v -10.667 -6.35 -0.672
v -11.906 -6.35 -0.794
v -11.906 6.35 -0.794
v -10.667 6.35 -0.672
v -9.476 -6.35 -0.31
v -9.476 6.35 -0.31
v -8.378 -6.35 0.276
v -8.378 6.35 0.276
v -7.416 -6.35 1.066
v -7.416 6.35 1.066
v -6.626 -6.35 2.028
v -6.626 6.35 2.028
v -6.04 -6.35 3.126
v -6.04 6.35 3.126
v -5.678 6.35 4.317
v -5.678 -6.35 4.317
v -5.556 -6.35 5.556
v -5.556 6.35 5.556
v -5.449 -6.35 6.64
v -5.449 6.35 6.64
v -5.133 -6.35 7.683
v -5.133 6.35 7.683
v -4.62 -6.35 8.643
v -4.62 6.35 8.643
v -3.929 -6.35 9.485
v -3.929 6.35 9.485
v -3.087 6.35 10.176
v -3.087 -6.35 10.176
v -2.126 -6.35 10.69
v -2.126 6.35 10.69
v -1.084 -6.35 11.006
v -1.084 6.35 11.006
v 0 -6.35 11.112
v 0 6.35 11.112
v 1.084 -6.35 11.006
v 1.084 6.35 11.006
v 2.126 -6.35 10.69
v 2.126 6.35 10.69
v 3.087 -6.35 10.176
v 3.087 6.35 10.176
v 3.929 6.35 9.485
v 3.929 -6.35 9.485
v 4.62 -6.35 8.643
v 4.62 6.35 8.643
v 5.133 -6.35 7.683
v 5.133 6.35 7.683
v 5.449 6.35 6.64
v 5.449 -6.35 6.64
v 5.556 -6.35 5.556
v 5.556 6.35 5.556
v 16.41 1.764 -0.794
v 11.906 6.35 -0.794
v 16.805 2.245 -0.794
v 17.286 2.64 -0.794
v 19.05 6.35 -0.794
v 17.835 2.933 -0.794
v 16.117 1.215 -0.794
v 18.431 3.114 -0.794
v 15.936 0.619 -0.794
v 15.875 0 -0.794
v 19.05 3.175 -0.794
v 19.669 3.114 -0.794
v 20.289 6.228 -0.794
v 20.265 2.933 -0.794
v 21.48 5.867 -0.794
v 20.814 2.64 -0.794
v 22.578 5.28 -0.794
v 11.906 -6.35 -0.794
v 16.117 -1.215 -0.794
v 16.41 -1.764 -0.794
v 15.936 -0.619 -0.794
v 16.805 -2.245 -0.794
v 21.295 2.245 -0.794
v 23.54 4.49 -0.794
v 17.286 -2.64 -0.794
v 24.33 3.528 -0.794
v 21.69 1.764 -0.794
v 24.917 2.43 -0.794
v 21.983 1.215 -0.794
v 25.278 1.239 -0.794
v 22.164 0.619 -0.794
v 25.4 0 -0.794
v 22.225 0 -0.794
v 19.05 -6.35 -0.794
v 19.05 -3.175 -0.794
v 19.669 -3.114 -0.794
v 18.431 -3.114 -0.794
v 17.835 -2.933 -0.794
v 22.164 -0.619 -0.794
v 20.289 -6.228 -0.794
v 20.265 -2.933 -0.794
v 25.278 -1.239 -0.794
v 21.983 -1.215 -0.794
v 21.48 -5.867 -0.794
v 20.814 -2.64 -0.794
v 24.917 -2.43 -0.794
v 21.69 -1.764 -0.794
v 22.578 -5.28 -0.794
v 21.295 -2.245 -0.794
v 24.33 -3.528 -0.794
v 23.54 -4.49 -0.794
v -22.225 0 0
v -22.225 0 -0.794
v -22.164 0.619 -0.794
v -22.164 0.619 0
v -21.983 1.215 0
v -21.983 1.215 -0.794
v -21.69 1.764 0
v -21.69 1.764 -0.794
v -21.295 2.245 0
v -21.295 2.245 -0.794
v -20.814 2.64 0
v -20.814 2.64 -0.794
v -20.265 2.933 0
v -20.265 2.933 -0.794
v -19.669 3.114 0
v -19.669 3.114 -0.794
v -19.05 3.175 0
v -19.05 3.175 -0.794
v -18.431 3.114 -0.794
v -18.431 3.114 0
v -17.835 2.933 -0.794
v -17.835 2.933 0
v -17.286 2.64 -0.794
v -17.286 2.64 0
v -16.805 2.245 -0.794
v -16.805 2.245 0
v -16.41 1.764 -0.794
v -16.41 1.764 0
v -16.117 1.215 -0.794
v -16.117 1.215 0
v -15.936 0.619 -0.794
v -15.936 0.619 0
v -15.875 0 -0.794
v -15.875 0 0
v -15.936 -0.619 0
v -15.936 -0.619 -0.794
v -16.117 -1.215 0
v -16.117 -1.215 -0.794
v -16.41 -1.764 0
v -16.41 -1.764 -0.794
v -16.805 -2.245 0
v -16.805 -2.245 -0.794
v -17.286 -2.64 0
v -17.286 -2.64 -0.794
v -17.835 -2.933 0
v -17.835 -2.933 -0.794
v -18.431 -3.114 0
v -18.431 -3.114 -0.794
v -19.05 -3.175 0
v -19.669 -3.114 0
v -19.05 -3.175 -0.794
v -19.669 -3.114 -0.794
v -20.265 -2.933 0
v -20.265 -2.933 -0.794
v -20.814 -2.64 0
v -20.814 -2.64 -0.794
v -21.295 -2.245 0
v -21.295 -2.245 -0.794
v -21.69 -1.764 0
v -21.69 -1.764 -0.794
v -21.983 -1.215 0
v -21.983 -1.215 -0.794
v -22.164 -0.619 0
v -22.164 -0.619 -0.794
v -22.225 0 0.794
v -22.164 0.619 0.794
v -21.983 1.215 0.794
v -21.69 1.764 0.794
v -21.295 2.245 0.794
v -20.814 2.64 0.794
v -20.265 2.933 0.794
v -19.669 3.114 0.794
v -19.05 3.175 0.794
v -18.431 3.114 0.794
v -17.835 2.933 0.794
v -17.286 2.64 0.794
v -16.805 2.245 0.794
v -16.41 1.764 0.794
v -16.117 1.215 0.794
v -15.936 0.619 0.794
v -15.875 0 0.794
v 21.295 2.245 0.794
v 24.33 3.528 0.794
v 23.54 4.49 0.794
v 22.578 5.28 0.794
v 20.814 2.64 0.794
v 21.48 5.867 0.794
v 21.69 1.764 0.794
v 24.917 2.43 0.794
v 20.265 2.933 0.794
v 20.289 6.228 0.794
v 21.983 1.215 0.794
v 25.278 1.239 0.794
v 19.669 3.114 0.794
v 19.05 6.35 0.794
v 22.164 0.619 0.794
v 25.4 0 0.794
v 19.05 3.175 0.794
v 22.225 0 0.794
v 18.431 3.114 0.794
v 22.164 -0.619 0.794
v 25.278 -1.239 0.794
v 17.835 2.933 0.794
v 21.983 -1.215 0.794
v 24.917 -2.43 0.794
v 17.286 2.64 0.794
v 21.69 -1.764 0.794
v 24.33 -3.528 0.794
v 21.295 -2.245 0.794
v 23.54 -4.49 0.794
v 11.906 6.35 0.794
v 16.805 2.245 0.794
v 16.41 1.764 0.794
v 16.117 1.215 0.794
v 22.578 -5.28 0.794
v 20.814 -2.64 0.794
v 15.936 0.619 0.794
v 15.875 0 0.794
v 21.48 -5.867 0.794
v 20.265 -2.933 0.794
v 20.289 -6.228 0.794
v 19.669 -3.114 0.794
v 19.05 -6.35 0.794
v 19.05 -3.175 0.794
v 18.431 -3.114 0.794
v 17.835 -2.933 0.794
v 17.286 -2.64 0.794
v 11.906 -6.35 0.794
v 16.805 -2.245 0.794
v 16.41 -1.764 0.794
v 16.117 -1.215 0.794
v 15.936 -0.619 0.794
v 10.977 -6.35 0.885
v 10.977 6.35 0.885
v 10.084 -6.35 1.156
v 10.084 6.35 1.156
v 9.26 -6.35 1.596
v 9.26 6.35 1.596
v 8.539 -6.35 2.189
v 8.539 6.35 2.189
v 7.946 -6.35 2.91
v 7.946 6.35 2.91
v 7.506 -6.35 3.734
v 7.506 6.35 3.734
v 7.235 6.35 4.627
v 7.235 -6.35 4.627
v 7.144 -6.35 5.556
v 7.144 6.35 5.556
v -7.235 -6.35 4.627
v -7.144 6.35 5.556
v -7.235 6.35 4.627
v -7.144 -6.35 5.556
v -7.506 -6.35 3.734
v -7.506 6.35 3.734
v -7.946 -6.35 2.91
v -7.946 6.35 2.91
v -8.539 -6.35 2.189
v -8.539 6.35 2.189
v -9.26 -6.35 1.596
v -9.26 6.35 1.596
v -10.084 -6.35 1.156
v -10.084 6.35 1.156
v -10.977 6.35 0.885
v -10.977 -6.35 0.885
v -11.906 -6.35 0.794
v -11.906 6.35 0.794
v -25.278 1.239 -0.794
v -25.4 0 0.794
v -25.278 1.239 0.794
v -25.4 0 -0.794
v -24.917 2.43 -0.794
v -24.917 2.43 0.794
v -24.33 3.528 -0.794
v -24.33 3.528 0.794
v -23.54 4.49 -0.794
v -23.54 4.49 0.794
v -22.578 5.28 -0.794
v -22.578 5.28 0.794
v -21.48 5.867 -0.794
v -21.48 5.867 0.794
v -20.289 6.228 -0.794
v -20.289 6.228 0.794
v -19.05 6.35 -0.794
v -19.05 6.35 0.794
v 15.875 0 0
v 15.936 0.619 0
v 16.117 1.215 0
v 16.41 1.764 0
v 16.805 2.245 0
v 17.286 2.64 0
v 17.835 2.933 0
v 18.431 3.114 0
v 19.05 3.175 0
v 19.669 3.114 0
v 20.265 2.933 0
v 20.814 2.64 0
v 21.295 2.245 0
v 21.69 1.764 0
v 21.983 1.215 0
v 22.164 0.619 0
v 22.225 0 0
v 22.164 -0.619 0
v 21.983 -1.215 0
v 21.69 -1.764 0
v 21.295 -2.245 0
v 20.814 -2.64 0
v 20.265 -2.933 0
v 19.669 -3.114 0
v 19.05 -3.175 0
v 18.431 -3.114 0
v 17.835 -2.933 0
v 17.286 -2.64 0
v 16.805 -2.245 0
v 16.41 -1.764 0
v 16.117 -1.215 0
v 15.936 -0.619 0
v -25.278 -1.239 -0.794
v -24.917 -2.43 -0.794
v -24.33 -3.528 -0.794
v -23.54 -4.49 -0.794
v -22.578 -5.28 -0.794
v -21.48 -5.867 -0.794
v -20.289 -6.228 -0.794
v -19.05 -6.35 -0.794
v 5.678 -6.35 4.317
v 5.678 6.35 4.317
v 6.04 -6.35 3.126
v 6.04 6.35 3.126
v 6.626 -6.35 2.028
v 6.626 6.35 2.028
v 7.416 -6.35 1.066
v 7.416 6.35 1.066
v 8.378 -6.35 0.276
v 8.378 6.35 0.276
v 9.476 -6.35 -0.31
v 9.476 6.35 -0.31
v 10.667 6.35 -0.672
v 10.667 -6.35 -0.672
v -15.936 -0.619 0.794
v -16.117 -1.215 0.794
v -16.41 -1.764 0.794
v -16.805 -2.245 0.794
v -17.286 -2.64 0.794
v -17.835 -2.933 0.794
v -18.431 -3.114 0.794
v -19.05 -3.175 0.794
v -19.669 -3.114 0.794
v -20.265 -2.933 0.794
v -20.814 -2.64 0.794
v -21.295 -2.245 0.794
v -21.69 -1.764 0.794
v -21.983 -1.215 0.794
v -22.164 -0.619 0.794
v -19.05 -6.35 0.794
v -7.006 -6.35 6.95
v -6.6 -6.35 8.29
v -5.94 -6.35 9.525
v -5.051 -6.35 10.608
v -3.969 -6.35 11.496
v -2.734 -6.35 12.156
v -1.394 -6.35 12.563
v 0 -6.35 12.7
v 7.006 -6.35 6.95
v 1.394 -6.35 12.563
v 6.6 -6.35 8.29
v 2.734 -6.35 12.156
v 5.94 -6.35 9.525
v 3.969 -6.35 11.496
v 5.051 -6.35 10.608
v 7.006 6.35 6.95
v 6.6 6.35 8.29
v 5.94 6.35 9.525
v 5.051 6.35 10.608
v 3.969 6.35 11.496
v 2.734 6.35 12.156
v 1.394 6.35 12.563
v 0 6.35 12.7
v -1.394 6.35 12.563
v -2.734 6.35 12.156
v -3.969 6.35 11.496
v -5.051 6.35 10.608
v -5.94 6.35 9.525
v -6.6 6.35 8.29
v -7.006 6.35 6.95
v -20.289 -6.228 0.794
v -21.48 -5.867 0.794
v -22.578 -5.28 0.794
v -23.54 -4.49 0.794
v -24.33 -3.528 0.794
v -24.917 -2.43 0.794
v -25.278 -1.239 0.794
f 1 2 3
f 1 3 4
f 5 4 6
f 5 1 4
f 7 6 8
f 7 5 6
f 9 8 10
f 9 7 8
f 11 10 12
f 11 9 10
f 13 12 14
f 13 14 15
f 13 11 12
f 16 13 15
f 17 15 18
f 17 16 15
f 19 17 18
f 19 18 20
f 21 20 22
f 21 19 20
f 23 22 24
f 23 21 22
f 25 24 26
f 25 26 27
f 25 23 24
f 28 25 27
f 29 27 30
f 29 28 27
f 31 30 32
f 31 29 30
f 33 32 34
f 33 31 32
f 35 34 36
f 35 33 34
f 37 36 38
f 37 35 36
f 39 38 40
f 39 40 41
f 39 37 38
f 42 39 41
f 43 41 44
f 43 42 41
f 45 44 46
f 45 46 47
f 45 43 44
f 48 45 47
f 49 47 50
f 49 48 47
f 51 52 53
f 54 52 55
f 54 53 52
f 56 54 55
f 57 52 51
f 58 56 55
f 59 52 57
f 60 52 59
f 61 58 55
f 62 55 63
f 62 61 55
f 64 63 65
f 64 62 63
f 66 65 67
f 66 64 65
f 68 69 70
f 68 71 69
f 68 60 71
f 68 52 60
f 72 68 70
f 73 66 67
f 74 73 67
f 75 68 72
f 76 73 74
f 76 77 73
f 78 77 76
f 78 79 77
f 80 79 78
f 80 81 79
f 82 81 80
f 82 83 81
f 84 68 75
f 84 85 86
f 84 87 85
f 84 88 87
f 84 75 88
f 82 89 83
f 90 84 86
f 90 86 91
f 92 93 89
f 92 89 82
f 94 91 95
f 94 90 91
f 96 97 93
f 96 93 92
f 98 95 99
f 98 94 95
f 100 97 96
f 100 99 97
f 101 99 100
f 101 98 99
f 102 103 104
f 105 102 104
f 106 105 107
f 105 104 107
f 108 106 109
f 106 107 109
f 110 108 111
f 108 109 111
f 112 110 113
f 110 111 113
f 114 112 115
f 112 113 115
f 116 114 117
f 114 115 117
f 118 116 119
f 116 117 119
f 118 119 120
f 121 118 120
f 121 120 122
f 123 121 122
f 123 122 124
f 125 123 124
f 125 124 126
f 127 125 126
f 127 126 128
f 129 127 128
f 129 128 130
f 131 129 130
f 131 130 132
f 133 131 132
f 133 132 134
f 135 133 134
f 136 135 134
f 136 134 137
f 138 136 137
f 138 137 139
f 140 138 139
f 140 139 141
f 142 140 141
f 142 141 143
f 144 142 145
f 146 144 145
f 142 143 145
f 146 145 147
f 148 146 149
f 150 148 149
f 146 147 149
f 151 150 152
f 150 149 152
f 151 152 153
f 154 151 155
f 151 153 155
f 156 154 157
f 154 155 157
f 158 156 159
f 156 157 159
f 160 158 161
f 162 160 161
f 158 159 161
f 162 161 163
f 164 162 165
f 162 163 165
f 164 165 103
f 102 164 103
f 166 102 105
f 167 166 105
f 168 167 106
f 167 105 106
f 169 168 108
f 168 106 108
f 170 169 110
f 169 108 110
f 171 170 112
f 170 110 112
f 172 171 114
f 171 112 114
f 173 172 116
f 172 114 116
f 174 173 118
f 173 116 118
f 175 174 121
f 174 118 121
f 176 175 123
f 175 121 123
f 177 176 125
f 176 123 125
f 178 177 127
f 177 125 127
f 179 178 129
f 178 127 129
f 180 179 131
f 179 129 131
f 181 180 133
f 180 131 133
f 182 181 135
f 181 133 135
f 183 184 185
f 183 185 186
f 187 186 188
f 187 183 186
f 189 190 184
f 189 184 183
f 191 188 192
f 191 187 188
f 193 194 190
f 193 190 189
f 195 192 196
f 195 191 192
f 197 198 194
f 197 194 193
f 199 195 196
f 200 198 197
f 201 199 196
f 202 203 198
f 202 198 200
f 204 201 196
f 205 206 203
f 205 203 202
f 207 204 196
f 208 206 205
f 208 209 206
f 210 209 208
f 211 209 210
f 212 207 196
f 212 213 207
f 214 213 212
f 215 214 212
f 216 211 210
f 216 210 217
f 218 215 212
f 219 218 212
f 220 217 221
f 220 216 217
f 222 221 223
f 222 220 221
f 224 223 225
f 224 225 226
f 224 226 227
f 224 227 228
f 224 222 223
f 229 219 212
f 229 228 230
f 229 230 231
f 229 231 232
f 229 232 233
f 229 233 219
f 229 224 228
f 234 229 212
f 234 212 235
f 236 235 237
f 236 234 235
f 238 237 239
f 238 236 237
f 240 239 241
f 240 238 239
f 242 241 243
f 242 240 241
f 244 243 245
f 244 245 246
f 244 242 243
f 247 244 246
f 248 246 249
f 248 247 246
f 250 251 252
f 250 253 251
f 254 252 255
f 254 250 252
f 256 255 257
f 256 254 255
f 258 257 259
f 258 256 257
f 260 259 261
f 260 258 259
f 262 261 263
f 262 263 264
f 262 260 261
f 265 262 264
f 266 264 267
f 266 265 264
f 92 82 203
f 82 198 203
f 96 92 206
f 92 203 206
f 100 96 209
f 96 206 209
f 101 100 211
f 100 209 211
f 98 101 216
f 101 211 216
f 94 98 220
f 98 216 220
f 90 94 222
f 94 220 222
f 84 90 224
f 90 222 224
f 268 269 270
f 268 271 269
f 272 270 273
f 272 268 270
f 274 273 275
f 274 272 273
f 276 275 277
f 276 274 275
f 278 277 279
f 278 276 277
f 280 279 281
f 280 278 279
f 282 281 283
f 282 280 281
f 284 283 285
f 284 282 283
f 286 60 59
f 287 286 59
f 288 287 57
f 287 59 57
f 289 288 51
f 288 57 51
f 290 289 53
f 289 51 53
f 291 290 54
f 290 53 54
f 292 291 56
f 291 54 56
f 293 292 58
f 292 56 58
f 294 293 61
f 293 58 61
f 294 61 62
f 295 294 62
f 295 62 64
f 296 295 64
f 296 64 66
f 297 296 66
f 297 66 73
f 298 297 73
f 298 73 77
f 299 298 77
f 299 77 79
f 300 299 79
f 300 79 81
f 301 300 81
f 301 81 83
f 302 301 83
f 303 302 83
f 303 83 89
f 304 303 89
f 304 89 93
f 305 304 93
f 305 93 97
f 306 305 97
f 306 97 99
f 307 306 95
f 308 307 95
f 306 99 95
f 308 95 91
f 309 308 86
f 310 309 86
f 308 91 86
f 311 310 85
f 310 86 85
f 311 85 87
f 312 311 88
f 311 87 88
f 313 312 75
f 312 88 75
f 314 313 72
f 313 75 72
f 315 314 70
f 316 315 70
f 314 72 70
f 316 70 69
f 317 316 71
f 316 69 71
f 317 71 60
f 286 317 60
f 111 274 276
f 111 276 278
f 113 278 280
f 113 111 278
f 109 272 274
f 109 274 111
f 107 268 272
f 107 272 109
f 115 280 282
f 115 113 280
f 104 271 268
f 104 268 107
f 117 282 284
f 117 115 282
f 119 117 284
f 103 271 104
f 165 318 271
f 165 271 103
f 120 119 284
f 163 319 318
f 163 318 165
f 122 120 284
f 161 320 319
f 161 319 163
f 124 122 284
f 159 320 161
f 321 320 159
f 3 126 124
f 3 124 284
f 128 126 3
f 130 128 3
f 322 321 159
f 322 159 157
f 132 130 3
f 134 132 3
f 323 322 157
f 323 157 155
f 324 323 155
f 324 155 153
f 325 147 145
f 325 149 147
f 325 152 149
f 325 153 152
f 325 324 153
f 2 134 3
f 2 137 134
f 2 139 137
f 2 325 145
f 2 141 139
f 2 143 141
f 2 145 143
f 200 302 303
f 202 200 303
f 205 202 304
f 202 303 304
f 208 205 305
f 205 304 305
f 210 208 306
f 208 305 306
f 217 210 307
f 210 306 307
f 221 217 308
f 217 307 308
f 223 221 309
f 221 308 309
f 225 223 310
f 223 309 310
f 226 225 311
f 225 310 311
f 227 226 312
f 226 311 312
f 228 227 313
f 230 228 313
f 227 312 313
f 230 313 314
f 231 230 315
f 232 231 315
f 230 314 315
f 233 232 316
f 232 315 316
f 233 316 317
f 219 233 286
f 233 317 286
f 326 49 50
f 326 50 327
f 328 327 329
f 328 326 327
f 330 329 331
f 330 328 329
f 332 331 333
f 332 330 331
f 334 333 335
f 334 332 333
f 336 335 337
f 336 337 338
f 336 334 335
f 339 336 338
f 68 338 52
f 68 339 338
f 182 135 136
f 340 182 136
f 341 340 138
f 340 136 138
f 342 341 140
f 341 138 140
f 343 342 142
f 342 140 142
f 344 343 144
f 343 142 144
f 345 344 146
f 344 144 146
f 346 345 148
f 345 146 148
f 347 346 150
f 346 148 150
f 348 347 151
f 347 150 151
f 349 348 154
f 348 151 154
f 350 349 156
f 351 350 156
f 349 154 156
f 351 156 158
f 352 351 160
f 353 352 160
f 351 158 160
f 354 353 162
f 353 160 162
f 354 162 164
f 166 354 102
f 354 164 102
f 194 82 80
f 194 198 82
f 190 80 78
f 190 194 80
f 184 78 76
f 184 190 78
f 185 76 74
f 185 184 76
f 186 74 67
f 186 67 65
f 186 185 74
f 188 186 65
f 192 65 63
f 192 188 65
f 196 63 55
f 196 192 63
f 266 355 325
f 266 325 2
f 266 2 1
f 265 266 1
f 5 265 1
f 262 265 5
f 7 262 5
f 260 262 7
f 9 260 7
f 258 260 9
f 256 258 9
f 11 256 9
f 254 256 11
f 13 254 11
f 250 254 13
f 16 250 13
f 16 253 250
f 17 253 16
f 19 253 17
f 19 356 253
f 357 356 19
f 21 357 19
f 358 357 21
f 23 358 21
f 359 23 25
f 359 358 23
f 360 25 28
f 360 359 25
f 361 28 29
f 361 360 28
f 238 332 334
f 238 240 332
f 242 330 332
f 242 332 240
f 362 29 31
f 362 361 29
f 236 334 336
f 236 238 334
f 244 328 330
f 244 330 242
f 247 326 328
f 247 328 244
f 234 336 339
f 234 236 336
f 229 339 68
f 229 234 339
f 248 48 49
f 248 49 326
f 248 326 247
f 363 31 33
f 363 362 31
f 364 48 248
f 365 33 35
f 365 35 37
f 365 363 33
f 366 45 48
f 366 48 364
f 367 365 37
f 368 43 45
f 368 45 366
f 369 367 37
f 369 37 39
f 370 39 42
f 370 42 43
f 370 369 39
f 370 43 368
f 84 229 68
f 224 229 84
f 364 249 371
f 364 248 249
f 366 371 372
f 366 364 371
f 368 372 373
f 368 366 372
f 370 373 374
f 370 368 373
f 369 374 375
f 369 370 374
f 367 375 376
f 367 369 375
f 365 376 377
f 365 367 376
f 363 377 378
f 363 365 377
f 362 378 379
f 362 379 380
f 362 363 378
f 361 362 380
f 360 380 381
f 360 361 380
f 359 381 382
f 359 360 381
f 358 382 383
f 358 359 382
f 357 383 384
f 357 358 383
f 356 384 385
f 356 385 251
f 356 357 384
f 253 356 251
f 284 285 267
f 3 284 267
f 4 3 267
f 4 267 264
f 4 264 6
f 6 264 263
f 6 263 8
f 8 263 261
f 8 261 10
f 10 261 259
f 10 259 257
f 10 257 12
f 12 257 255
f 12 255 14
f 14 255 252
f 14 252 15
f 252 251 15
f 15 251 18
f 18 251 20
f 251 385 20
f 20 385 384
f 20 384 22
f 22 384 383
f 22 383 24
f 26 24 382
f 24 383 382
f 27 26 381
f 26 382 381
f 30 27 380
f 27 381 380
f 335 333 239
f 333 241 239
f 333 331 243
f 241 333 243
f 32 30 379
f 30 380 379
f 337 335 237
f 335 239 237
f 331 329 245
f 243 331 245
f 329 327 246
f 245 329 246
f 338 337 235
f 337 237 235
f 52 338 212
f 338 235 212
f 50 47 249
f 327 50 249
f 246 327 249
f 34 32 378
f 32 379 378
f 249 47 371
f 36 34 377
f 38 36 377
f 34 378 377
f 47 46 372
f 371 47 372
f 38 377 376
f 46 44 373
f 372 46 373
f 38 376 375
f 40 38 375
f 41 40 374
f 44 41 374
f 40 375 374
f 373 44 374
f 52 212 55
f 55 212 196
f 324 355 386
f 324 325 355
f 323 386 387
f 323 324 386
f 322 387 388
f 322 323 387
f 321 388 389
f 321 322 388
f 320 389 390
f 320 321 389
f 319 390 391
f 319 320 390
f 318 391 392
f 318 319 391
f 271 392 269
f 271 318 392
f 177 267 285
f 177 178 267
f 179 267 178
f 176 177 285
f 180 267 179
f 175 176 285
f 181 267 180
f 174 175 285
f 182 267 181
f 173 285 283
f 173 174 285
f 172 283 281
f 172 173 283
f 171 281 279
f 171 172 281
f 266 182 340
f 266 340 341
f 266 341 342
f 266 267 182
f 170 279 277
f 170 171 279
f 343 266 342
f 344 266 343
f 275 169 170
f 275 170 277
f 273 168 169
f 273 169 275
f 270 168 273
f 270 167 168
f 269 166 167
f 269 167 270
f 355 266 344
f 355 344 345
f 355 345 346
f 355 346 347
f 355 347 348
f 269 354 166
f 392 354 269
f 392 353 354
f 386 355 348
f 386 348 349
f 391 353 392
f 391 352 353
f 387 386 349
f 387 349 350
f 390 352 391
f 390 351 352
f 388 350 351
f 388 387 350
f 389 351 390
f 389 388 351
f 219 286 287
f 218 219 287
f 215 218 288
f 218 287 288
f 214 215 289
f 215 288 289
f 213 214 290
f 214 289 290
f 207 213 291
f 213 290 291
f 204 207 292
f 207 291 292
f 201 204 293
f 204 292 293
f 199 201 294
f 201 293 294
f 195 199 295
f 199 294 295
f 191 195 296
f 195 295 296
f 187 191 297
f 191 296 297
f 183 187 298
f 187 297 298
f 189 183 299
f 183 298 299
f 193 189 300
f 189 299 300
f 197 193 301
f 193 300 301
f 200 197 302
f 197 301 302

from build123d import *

# Parameters (mm, degrees)
F1_DEPTH = 6.35
F2_R     = 6.34999
F4_D     = 6.35
F4_DEPTH = 12.701
F5_D     = 6.35


# Not quite as in the source:
# - a fillet or chamfer is up to 0.001 mm smaller than in the source, because OpenCascade refuses the exact size


with BuildPart() as f1:
    # F0 (on Front) → F1 (new body, symmetric)
    with BuildSketch(Plane.XZ):
        with BuildLine():
            Line((-11.90625, 0.79375), (-25.4, 0.79375))
            Line((-25.4, 0.79375), (-25.4, -0.79375))
            Line((-25.4, -0.79375), (-11.90625, -0.79375))
            ThreePointArc((-11.90625, -0.79375), (-7.4161219395, 1.0661219395), (-5.55625, 5.55625))
            ThreePointArc((-5.55625, 5.55625), (0, 11.1125), (5.55625, 5.55625))
            ThreePointArc((5.55625, 5.55625), (7.4161219395, 1.0661219395), (11.90625, -0.79375))
            Line((11.90625, -0.79375), (25.4, -0.79375))
            Line((25.4, -0.79375), (25.4, 0.79375))
            Line((25.4, 0.79375), (11.90625, 0.79375))
            ThreePointArc((11.90625, 0.79375), (8.5386539546, 2.1886539546), (7.14375, 5.55625))
            ThreePointArc((7.14375, 5.55625), (0, 12.7), (-7.14375, 5.55625))
            ThreePointArc((-7.14375, 5.55625), (-8.5386539546, 2.1886539546), (-11.90625, 0.79375))
        make_face()
    extrude(amount=F1_DEPTH, both=True)

    # F2 (radius 6.35 in the source; OpenCascade refuses exactly that, so slightly less here)
    f2_edges = [f1.edges().sort_by_distance(p)[0] for p in [
        (25.4, -6.35, 0),
        (25.4, 6.35, 0),
        (-25.4, -6.35, 0),
        (-25.4, 6.35, 0),
    ]]
    fillet(f2_edges, radius=F2_R)

    # F4 (through all, one way)
    with BuildSketch(Plane(origin=(0, 0, 0), x_dir=(1, 0, 0), z_dir=(0, 0, -1))):
        with Locations((-19.05, 0), (19.05, 0)):
            Circle(F4_D / 2)
    extrude(amount=-F4_DEPTH, mode=Mode.SUBTRACT)

    # F5 (through all)
    with Locations(Plane.XY):
        with Locations((-19.05, 0), (19.05, 0)):
            Hole(F5_D / 2)


solid = f1.part
